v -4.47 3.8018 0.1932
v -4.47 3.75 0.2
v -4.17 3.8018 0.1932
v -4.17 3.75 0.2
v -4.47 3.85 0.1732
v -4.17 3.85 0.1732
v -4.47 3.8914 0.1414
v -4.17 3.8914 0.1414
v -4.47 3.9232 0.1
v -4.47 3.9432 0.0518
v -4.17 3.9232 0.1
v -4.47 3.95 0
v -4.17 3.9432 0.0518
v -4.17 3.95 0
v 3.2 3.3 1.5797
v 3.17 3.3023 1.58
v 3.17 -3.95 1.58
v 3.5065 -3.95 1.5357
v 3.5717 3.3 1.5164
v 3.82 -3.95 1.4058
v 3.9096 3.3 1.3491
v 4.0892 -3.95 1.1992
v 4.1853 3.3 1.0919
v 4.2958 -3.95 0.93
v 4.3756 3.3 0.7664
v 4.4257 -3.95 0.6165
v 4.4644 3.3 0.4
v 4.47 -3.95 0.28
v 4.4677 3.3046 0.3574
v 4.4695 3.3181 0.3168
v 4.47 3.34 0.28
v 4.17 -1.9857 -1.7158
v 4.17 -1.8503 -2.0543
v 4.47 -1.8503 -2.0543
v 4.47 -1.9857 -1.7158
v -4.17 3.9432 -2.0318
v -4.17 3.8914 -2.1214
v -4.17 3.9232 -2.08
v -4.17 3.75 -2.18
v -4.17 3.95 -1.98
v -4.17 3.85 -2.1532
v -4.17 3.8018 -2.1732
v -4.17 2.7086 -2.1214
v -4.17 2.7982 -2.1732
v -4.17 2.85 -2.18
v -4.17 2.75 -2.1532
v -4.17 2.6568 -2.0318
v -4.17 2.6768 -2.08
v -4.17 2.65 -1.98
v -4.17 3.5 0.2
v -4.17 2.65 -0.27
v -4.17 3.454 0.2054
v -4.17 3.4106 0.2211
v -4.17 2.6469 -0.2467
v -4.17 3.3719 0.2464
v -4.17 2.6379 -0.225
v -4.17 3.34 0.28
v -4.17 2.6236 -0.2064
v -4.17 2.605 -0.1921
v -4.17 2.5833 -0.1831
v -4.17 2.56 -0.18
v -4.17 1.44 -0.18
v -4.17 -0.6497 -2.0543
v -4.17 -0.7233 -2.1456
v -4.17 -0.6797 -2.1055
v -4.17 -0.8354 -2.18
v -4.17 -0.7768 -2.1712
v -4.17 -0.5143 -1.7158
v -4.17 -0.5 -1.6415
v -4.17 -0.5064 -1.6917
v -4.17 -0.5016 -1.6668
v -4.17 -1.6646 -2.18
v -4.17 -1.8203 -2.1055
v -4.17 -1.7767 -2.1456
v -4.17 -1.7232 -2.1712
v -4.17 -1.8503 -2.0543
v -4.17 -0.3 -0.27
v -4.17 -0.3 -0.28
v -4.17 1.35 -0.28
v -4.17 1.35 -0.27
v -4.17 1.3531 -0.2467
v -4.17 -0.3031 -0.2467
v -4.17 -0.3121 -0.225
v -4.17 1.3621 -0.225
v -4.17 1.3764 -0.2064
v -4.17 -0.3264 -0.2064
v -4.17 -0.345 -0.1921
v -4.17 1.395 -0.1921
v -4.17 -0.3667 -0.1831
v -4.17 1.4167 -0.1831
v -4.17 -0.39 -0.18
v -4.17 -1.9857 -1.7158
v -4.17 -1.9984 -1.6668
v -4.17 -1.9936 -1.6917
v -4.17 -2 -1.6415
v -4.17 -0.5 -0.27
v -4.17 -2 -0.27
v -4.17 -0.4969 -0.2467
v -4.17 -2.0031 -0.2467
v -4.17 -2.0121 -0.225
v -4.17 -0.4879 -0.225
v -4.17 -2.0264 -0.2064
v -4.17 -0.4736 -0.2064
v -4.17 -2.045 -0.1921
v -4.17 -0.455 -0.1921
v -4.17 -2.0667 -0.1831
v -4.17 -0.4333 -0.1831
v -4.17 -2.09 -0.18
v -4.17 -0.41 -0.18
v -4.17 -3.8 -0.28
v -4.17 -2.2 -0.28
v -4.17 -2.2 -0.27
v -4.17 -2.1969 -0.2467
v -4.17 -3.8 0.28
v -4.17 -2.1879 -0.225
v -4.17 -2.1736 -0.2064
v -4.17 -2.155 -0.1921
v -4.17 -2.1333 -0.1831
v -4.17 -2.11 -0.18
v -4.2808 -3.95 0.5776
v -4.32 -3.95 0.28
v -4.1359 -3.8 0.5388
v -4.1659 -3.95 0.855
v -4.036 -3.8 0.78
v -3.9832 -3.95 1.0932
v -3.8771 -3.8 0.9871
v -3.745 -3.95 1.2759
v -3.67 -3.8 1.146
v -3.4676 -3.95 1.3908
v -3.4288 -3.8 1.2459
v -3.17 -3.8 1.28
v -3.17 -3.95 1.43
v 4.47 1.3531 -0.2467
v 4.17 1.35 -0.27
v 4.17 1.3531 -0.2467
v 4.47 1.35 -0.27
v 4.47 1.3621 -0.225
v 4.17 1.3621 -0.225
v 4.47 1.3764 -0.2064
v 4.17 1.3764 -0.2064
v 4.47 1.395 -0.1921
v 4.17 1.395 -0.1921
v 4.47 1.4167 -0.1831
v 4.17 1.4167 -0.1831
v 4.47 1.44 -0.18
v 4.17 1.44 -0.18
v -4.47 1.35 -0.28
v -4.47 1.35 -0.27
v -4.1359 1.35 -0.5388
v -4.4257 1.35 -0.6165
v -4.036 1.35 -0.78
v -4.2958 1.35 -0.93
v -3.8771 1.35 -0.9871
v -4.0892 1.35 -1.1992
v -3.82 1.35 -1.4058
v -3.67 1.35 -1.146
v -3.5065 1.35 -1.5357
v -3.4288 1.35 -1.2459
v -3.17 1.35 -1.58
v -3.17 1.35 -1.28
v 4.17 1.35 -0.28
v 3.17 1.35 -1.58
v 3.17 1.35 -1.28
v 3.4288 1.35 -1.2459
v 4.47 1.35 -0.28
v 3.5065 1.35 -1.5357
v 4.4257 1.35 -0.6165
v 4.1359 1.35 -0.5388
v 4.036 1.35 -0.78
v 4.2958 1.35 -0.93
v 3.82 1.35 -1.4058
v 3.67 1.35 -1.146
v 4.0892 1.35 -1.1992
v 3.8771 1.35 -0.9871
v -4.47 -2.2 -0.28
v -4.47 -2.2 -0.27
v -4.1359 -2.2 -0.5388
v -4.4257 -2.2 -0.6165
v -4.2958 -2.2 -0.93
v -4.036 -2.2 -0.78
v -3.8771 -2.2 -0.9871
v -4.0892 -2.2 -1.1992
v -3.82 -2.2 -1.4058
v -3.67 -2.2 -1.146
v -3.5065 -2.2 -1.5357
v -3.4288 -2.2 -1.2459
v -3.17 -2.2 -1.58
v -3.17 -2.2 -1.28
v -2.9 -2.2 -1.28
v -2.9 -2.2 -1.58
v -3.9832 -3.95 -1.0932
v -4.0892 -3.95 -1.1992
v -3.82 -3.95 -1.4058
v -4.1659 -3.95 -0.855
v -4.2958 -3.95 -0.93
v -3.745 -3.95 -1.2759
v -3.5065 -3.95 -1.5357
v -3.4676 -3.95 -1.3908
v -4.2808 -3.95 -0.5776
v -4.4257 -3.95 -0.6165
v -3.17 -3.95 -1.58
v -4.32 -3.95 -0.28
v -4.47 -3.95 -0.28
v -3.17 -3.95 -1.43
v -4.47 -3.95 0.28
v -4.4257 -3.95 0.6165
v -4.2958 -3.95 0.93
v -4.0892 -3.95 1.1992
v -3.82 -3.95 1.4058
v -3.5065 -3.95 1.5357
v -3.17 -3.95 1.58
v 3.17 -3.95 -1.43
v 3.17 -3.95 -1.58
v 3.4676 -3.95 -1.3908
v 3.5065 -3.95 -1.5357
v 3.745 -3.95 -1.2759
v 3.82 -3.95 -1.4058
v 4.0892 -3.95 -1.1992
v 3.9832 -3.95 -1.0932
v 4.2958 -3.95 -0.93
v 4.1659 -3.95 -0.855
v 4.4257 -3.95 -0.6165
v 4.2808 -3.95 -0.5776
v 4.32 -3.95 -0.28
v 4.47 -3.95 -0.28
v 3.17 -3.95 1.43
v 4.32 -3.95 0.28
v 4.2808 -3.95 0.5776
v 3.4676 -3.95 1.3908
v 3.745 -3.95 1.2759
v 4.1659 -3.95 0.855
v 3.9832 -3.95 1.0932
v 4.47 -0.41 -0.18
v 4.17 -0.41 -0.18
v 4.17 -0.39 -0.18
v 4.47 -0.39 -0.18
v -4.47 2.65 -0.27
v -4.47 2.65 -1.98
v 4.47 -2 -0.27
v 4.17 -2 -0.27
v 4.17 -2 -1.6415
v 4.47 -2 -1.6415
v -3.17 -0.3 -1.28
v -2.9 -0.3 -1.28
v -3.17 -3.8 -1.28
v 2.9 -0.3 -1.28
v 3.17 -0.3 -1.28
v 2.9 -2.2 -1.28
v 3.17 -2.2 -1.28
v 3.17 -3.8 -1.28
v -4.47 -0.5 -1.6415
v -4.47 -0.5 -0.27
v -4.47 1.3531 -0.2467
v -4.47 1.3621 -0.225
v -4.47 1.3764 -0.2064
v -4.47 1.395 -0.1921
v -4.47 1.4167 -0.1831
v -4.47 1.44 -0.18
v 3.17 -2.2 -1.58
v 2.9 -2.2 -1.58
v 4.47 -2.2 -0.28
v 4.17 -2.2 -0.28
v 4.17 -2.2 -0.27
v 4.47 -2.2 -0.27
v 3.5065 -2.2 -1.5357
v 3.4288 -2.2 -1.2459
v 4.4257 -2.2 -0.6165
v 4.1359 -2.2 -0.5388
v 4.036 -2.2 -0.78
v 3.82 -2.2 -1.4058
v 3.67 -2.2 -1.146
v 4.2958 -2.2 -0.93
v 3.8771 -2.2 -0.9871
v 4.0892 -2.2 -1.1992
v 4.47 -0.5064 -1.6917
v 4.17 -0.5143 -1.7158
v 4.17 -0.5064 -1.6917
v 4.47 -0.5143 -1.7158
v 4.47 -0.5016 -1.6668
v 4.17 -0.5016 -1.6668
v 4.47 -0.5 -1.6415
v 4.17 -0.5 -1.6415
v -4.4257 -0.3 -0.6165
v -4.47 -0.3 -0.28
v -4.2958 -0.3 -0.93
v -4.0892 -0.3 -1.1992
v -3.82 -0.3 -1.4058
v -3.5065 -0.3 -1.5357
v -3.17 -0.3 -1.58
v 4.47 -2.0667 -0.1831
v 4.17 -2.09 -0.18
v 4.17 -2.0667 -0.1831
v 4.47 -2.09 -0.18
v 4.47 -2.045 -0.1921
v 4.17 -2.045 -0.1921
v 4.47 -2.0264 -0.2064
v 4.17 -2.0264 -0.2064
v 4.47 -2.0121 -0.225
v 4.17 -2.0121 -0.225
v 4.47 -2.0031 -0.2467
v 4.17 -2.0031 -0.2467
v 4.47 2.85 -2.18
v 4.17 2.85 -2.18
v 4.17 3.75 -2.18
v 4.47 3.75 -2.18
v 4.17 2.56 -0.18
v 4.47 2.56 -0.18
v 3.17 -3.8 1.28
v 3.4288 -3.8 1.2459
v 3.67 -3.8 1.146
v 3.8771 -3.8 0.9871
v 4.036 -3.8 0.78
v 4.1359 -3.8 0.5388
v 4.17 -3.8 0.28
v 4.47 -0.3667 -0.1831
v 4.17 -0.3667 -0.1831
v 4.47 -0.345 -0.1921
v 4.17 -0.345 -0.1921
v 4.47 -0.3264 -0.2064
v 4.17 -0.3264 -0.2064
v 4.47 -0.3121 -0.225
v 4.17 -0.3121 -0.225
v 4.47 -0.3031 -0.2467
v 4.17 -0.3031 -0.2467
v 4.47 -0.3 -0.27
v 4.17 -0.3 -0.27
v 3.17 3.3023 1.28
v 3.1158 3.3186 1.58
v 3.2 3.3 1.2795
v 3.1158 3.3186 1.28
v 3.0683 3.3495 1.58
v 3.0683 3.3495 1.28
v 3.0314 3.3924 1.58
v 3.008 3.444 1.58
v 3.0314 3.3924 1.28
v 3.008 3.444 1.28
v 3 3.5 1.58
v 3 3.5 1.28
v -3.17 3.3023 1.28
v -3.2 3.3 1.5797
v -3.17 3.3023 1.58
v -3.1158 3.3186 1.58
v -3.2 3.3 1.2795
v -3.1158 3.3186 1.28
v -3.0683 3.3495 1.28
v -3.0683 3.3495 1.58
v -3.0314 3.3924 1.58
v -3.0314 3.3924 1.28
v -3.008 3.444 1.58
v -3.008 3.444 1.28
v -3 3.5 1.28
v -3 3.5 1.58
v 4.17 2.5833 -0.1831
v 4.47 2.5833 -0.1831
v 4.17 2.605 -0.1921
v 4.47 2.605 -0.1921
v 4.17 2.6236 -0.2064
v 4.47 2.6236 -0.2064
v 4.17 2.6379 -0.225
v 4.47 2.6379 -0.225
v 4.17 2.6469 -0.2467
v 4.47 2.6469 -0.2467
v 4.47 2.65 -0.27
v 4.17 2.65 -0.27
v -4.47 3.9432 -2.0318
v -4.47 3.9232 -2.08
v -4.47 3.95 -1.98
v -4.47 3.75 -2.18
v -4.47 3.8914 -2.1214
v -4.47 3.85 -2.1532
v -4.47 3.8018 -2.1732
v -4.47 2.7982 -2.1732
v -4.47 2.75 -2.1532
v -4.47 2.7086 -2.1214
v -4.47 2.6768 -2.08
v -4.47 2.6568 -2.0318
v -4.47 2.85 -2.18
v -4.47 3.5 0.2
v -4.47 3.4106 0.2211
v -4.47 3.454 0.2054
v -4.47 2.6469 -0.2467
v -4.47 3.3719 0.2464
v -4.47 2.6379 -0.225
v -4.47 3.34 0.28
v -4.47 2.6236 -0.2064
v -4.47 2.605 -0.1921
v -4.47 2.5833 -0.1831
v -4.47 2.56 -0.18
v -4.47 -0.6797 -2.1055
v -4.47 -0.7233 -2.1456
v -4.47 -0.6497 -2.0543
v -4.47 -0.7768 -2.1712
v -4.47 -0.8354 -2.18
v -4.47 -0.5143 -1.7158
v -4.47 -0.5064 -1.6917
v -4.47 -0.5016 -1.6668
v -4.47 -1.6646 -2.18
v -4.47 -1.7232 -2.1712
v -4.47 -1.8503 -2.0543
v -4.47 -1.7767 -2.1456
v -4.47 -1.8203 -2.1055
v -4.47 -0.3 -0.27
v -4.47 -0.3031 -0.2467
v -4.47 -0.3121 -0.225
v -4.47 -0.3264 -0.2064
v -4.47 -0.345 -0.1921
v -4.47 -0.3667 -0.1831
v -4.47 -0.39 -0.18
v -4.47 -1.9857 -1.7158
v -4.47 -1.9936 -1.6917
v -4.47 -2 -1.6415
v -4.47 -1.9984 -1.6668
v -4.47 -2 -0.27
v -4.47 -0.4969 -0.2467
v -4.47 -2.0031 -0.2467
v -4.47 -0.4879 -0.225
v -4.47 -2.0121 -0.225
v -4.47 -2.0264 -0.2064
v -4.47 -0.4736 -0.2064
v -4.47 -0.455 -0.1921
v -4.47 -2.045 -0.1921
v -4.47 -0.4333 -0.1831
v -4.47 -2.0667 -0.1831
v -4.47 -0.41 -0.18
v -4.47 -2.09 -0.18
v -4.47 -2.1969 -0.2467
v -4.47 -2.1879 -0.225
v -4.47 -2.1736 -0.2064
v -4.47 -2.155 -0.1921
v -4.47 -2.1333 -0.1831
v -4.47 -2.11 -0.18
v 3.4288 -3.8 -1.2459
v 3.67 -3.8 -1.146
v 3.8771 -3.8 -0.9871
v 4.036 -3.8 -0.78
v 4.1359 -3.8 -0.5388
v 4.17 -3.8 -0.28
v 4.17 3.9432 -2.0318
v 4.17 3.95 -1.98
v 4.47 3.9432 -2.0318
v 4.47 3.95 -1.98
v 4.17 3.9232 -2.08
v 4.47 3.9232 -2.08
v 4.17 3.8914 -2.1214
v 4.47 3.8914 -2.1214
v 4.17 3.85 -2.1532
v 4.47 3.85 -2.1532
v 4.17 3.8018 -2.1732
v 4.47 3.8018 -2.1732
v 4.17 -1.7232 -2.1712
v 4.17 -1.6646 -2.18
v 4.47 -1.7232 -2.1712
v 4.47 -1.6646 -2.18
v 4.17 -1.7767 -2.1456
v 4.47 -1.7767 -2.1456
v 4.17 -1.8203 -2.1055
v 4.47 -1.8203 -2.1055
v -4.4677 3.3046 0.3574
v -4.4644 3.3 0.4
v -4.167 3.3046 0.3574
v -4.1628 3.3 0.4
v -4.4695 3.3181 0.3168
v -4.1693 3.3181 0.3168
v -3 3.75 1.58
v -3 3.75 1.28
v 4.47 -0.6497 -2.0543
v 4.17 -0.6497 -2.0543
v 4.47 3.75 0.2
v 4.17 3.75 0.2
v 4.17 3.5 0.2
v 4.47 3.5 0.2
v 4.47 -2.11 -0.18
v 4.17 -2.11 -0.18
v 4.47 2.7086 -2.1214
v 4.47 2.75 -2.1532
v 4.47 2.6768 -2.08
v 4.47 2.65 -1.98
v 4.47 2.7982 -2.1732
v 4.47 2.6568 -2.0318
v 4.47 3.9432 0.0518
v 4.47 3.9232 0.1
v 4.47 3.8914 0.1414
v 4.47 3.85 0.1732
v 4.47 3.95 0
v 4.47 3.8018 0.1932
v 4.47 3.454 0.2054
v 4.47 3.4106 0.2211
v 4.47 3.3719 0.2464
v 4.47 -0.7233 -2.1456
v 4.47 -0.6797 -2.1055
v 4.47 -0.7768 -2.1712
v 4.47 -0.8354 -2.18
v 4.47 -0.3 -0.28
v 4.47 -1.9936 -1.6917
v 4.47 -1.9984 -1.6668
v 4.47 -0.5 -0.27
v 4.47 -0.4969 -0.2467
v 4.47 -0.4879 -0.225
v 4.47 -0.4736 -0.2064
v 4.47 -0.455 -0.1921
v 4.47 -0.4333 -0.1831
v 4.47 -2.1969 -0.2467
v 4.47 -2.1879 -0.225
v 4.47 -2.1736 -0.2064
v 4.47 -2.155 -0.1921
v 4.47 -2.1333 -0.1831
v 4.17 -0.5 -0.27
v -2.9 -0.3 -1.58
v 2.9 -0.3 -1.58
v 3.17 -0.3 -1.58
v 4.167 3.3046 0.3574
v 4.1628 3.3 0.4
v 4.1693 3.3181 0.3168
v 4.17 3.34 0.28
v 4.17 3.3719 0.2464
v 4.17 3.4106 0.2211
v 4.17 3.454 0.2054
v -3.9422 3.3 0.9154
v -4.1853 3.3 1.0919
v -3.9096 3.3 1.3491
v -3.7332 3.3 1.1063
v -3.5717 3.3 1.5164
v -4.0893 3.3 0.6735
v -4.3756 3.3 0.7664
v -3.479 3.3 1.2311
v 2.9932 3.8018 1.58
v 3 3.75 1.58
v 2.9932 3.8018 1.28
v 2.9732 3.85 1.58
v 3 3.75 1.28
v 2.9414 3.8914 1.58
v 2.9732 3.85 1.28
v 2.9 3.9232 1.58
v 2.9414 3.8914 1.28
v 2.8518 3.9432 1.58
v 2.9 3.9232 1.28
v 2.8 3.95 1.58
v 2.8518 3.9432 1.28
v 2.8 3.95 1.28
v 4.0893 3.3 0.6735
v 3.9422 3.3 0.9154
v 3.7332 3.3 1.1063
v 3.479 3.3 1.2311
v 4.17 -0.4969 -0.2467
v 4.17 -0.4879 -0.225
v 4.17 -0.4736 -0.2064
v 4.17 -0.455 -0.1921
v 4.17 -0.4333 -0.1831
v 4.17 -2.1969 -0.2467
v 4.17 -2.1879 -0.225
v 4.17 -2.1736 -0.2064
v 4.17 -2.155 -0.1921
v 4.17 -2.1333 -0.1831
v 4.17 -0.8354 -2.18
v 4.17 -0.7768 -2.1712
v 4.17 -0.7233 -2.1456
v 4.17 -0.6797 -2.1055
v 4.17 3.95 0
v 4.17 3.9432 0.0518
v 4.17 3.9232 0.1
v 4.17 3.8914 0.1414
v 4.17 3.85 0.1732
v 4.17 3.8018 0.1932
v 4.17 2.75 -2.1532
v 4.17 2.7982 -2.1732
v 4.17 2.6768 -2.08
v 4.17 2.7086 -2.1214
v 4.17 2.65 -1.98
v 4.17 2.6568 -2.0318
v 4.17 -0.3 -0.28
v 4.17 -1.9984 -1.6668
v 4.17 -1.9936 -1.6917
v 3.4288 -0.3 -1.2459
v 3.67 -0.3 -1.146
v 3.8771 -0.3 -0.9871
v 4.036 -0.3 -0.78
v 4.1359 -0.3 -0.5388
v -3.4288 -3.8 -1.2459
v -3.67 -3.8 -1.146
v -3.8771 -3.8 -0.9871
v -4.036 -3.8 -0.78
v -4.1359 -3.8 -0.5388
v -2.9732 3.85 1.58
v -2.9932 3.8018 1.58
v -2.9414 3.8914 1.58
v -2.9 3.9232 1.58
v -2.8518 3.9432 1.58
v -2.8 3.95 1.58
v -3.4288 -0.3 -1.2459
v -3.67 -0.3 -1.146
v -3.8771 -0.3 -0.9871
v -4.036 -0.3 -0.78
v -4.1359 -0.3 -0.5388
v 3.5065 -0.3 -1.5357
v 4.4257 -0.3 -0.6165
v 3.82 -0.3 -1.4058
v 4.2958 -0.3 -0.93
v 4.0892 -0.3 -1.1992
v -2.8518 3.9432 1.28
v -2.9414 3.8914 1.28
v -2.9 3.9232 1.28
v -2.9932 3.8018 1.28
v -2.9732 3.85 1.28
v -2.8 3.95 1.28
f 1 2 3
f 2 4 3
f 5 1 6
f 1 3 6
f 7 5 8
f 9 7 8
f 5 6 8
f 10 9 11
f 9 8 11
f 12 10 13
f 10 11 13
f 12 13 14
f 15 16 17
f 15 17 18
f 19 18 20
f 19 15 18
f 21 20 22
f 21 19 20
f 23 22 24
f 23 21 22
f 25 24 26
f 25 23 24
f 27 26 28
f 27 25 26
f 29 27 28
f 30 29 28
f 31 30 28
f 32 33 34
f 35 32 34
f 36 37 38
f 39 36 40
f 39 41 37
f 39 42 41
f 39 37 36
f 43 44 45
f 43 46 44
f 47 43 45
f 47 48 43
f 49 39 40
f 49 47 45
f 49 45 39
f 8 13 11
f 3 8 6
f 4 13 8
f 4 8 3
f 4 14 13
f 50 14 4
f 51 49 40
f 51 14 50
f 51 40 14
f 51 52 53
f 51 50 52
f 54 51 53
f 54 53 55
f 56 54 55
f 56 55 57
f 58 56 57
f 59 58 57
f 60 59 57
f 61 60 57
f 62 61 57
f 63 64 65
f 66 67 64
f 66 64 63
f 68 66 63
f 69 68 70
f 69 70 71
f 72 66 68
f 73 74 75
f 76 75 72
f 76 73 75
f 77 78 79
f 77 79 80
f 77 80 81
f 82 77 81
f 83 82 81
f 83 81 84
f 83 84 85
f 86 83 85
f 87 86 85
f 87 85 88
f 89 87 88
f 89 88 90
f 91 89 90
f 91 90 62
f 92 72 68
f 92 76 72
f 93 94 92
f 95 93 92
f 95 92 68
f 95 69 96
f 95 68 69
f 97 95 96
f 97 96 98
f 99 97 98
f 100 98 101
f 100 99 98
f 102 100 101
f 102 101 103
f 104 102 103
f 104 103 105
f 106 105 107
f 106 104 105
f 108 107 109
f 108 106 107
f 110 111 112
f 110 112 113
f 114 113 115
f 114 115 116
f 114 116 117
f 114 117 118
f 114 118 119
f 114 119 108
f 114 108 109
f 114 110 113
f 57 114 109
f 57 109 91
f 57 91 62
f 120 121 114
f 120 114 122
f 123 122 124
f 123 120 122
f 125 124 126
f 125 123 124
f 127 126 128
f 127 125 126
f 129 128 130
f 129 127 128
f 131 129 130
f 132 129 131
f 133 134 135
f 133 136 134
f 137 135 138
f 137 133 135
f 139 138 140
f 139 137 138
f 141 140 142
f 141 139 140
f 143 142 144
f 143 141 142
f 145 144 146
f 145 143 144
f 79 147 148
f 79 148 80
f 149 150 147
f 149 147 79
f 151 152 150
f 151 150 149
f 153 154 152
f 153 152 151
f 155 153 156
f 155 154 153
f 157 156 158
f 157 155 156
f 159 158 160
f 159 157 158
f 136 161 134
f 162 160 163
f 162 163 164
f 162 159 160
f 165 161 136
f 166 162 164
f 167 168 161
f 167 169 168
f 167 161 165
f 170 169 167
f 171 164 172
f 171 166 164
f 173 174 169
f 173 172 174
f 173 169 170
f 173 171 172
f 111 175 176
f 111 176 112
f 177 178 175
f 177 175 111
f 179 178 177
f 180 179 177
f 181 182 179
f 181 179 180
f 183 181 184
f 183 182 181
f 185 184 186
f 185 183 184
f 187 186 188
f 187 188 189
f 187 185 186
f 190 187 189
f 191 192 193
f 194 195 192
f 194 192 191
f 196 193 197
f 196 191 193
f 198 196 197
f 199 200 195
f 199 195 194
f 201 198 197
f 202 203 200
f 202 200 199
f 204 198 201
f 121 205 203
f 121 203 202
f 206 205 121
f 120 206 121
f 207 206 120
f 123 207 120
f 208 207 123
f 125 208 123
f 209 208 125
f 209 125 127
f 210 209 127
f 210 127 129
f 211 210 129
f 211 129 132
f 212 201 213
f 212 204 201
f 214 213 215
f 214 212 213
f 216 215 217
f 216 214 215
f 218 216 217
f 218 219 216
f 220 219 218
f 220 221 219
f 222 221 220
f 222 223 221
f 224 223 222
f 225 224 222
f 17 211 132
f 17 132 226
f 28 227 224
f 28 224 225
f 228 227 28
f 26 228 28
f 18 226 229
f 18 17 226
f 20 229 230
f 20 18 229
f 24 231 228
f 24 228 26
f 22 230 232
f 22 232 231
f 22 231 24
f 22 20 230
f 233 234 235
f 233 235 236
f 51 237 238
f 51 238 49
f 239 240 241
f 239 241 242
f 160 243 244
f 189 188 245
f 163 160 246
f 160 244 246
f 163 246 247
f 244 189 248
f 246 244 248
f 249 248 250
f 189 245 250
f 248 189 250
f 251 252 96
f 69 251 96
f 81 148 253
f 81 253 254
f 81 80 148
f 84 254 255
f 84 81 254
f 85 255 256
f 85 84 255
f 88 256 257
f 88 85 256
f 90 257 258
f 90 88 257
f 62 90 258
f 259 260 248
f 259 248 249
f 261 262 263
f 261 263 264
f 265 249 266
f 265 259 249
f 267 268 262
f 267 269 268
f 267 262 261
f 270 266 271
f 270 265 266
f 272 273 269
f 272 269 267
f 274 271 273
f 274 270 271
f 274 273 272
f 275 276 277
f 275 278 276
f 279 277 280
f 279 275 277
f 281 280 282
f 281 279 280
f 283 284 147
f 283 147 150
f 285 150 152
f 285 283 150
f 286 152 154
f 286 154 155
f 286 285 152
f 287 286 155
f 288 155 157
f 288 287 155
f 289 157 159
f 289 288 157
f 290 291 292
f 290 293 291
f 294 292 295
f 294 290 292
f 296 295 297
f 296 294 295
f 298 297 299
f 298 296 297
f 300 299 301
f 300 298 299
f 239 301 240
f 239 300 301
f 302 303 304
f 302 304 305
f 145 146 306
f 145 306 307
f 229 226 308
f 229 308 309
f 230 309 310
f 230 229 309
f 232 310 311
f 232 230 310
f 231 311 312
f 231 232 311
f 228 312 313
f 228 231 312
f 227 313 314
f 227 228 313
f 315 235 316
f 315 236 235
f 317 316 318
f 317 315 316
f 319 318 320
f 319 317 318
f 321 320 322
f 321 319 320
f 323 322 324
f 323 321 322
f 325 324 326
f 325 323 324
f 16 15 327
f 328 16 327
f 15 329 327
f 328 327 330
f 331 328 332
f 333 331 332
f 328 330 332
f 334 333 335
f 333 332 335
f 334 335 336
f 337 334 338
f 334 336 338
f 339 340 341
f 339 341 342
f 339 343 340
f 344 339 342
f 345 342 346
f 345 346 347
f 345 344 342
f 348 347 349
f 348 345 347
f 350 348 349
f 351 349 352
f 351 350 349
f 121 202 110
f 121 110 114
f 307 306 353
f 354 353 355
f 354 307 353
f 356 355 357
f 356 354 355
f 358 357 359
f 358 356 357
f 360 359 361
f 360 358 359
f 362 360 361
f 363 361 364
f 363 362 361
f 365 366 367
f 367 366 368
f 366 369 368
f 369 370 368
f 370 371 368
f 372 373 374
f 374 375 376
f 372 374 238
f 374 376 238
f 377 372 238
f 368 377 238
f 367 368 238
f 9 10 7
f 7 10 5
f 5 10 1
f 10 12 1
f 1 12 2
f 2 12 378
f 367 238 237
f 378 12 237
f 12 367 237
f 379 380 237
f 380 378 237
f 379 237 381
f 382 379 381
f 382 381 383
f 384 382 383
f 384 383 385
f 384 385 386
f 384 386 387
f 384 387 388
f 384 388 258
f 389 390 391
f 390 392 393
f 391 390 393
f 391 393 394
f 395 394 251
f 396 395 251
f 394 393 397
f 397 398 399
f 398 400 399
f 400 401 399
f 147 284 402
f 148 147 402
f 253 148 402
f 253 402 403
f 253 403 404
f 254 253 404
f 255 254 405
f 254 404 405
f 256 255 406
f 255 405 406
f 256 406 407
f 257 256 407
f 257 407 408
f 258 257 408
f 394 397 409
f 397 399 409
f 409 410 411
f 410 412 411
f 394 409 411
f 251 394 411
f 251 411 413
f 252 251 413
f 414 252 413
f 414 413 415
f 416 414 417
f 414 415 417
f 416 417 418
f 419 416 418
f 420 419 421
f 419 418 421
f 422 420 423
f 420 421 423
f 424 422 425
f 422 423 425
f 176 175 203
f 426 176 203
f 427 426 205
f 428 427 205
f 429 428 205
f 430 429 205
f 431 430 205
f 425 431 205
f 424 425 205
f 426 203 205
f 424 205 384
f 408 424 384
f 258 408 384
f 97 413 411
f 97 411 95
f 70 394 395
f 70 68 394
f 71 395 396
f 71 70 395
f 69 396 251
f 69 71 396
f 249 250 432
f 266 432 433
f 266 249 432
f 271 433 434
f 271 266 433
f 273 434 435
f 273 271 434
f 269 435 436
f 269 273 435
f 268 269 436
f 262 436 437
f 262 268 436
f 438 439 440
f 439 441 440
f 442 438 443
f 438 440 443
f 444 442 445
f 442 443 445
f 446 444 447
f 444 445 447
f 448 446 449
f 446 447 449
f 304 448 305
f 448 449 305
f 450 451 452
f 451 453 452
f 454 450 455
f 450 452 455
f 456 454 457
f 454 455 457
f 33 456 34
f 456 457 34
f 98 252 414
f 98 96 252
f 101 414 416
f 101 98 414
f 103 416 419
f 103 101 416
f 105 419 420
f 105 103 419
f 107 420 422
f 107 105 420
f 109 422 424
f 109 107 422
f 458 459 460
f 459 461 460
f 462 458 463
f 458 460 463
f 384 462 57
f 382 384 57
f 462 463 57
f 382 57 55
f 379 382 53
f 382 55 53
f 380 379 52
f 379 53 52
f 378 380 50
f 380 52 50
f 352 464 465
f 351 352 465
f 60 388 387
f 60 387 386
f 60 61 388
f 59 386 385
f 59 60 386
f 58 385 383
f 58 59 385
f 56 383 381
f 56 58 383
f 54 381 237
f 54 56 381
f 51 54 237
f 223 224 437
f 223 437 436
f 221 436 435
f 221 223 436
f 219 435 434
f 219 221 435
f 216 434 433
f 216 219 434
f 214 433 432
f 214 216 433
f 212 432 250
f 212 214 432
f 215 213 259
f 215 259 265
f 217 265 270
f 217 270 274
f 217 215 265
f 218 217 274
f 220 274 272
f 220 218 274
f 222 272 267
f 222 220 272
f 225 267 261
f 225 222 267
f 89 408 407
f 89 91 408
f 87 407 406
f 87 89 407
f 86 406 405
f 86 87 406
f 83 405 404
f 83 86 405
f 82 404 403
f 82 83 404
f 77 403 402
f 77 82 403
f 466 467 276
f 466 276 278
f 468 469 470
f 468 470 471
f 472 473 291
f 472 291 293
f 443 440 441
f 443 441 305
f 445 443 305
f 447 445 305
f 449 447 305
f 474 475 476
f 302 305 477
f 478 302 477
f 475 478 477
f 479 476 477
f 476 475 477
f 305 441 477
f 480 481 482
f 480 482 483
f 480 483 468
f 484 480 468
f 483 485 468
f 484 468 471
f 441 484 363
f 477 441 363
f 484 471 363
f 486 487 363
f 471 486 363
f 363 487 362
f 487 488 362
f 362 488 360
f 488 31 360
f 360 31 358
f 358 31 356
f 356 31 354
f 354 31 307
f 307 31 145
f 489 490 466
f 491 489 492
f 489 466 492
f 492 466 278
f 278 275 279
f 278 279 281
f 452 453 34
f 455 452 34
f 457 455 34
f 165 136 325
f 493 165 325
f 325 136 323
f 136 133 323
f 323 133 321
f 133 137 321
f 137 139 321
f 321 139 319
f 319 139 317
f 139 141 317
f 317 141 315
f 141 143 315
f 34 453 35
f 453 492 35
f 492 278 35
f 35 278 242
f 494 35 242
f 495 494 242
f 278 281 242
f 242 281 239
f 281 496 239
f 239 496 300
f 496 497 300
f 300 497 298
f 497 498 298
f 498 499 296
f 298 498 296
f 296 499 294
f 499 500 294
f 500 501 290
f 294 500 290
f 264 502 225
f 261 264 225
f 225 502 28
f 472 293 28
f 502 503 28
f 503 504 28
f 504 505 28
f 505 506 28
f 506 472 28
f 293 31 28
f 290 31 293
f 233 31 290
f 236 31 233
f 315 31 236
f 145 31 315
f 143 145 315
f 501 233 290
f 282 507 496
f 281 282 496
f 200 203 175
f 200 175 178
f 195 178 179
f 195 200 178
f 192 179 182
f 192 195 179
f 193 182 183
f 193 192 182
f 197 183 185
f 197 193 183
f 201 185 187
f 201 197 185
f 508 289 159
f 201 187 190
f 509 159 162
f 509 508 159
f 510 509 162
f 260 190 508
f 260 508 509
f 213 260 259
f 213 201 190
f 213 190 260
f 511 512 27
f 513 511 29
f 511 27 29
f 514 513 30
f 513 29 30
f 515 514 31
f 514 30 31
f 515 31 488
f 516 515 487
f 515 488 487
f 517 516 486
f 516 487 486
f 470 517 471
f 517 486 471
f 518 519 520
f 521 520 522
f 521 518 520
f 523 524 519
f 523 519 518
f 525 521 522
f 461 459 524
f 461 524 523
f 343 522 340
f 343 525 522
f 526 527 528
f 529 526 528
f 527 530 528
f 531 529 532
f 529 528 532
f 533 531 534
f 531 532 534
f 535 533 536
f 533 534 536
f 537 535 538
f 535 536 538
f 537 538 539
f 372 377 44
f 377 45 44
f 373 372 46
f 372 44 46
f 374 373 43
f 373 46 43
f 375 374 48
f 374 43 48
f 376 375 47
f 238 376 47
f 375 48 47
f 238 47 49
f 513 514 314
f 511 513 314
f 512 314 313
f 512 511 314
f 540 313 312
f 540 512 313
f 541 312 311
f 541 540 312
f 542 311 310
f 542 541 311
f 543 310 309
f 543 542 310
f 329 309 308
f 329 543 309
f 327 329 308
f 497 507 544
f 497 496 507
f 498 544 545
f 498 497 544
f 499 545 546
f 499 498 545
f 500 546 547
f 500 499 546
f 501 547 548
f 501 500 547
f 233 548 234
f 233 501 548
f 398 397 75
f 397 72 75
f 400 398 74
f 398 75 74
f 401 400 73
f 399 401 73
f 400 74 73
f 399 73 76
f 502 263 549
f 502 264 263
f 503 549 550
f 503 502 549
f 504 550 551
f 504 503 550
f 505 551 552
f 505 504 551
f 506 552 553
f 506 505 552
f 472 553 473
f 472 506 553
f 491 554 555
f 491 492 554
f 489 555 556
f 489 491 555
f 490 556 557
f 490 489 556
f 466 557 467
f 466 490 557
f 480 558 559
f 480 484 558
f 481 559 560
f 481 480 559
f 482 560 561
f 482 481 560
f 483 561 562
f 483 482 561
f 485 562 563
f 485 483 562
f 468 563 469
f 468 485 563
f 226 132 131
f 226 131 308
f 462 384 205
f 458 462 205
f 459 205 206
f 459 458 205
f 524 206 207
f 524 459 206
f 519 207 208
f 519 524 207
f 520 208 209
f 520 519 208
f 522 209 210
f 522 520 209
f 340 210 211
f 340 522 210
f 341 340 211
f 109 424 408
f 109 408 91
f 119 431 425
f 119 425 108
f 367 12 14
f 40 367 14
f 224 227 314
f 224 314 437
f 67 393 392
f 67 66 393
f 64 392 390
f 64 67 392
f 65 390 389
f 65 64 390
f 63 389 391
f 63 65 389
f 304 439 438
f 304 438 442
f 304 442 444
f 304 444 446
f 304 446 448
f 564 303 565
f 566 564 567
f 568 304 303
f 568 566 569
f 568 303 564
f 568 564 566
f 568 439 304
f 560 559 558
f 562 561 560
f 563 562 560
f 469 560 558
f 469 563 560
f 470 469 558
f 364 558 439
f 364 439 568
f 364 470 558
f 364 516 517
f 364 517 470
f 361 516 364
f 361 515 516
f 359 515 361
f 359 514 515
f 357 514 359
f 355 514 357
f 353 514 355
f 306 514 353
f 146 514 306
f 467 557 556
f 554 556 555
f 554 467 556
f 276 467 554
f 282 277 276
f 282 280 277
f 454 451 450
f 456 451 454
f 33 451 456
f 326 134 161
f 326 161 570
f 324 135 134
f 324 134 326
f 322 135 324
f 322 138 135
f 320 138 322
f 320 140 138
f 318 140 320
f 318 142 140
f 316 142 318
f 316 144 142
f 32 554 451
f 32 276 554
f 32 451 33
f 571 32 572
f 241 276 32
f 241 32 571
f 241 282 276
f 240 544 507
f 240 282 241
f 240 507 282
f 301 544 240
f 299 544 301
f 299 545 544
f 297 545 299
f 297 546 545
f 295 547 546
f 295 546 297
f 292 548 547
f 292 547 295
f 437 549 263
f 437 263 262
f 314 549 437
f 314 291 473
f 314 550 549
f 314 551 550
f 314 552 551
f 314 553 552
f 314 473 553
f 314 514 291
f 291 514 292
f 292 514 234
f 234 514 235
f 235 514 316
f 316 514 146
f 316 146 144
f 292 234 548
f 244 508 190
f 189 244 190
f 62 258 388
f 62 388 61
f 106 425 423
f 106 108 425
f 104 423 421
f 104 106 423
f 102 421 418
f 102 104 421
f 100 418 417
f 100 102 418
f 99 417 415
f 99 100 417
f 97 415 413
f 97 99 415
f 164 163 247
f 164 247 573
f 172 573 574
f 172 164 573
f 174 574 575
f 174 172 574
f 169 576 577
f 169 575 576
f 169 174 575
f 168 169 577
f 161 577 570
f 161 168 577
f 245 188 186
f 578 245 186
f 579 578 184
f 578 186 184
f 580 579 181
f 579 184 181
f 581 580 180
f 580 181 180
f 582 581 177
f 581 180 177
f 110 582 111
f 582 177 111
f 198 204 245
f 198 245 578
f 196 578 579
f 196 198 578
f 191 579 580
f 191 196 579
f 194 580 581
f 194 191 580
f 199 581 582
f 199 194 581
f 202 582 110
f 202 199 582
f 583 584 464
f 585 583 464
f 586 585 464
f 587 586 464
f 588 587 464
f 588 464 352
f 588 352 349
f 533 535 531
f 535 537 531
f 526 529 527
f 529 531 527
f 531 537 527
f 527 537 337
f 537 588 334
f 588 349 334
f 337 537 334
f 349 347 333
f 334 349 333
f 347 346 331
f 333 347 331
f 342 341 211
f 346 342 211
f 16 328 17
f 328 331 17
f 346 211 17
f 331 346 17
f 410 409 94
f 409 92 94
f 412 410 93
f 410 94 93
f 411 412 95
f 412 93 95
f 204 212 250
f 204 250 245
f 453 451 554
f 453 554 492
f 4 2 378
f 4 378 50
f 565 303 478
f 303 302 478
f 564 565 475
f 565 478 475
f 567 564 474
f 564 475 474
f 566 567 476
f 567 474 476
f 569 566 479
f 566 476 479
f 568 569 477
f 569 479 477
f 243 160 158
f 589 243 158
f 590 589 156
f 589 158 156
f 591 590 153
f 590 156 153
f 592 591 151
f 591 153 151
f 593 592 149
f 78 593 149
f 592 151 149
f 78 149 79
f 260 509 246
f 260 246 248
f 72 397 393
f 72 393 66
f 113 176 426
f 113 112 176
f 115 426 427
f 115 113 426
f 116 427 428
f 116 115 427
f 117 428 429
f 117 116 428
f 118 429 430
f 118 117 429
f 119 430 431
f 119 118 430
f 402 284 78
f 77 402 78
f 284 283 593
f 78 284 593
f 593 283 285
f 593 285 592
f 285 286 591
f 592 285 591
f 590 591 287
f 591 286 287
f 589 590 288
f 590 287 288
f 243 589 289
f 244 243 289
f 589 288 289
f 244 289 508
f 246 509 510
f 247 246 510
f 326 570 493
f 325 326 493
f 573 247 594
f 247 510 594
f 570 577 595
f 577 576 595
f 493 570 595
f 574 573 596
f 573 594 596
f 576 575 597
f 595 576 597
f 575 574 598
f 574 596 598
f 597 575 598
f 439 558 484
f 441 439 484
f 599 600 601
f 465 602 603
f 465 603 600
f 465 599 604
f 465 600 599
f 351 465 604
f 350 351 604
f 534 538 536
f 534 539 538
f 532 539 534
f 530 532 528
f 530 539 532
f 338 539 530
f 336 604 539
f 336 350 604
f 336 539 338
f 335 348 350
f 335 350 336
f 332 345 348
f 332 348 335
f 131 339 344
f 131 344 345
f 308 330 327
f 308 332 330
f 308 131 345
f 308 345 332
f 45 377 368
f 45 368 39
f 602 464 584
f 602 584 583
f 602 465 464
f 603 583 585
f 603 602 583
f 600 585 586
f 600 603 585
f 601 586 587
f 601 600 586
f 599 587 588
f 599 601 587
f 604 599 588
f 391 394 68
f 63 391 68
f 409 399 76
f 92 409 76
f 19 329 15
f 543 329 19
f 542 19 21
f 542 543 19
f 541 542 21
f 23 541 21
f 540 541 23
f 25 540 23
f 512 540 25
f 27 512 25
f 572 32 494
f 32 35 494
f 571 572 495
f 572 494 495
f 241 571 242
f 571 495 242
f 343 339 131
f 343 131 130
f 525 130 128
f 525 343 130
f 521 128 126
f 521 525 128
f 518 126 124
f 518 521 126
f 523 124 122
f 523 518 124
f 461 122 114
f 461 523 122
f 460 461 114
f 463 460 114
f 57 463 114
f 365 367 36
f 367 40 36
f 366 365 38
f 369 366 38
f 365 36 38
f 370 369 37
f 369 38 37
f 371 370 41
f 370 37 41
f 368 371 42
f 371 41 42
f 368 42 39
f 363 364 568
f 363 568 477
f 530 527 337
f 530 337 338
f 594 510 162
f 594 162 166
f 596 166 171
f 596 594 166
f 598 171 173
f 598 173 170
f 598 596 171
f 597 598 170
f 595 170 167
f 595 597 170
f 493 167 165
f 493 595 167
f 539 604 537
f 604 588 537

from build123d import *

# Parameters (mm, degrees)
SKETCH_W           = 8.94
SKETCH_H           = 3.16
PAD_DEPTH          = 3.95
SKETCH001_W        = 8.34
SKETCH001_H        = 2.56
POCKET_DEPTH       = 7.901
FILLET_R           = 1
FILLET001_R        = 1.3
CHAMFER_SIZE       = 0.15
SKETCH002_W        = 2
SKETCH002_H        = 1.9
SKETCH002_H_2      = 2.6
POCKET001_DEPTH    = 1.4
SKETCH003_W        = 0.3
SKETCH003_H        = 1.5
SKETCH003_H_2      = 1.3
PAD001_DEPTH       = 2
FILLET002_R        = 0.09
CHAMFER001_1_SIZE2 = 0.2
CHAMFER001_1_SIZE  = 0.5
CHAMFER001_2_SIZE2 = 0.2
CHAMFER001_2_SIZE  = 0.5
CHAMFER001_3_SIZE2 = 0.2
CHAMFER001_3_SIZE  = 0.5
CHAMFER002_SIZE2   = 0.5
CHAMFER002_SIZE    = 0.2
FILLET003_R        = 0.2
SKETCH004_W        = 5.8
SKETCH004_H        = 2.6
POCKET002_DEPTH    = 0.5
SKETCH005_W        = 1.7
SKETCH005_H        = 1.7
POCKET003_DEPTH    = 0.65
FILLET004_R        = 0.2


with BuildPart() as part:
    # Sketch → Pad (new body, symmetric)
    with BuildSketch(Plane.XZ):
        Rectangle(SKETCH_W, SKETCH_H)
    extrude(amount=PAD_DEPTH, both=True)

    # Sketch001 (on Face6 of Pad) → Pocket (cut, through all)
    with BuildSketch(Plane.XZ.offset(3.95)):
        Rectangle(SKETCH001_W, SKETCH001_H)
    extrude(amount=-POCKET_DEPTH, mode=Mode.SUBTRACT)

    # Fillet
    fillet_edges = [part.edges().sort_by_distance(p)[0] for p in [
        (-4.17, 0, -1.28),
        (-4.17, 0, 1.28),
        (4.17, 0, -1.28),
        (4.17, 0, 1.28),
    ]]
    fillet(fillet_edges, radius=FILLET_R)

    # Fillet001
    fillet001_edges = [part.edges().sort_by_distance(p)[0] for p in [
        (-4.47, 0, 1.58),
        (-4.47, 0, -1.58),
        (4.47, 0, 1.58),
        (4.47, 0, -1.58),
    ]]
    fillet(fillet001_edges, radius=FILLET001_R)

    # Chamfer
    chamfer_edges = [part.edges().sort_by_distance(p)[0] for p in [
        (0, -3.95, 1.28),
    ]]
    chamfer(chamfer_edges, length=CHAMFER_SIZE)

    # Sketch002 (on Face17 of Chamfer) → Pocket001 (cut)
    with BuildSketch(Plane(origin=(0, 0, -1.58), x_dir=(1, 0, 0), z_dir=(0, 0, -1))):
        with Locations((3.9, 1.25)):
            Rectangle(SKETCH002_W, SKETCH002_H)
        with Locations((-3.9, 1.25)):
            Rectangle(SKETCH002_W, SKETCH002_H)
        with Locations((-3.9, -2.65)):
            Rectangle(SKETCH002_W, SKETCH002_H_2)
        with Locations((3.9, -2.65)):
            Rectangle(SKETCH002_W, SKETCH002_H_2)
    extrude(amount=-POCKET001_DEPTH, mode=Mode.SUBTRACT)

    # Sketch003 (on Face5 of Pocket001) → Pad001 (join)
    with BuildSketch(Plane(origin=(0, 0, -0.18), x_dir=(1, 0, 0), z_dir=(0, 0, -1))):
        with Locations((-4.32, 1.25)):
            Rectangle(SKETCH003_W, SKETCH003_H)
        with Locations((4.32, 1.25)):
            Rectangle(SKETCH003_W, SKETCH003_H)
        with Locations((4.32, -3.3)):
            Rectangle(SKETCH003_W, SKETCH003_H_2)
        with Locations((-4.32, -3.3)):
            Rectangle(SKETCH003_W, SKETCH003_H_2)
    extrude(amount=PAD001_DEPTH)

    # Fillet002
    fillet002_edges = [part.edges().sort_by_distance(p)[0] for p in [
        (-4.32, -2, -0.18),
        (-4.32, -2.2, -0.18),
        (-4.32, -0.5, -0.18),
        (-4.32, -0.3, -0.18),
        (-4.32, 1.35, -0.18),
        (-4.32, 2.65, -0.18),
        (4.32, 2.65, -0.18),
        (4.32, 1.35, -0.18),
        (4.32, -2.2, -0.18),
        (4.32, -2, -0.18),
        (4.32, -0.5, -0.18),
        (4.32, -0.3, -0.18),
    ]]
    fillet(fillet002_edges, radius=FILLET002_R)

    # Chamfer001 1
    chamfer001_1_edges = [part.edges().sort_by_distance(p)[0] for p in [
        (4.32, -2, -2.18),
    ]]
    chamfer001_1_side = part.faces().sort_by_distance((4.32, -2, -1.225))[0]
    chamfer(chamfer001_1_edges, length=CHAMFER001_1_SIZE, length2=CHAMFER001_1_SIZE2, reference=chamfer001_1_side)

    # Chamfer001 2
    chamfer001_2_edges = [part.edges().sort_by_distance(p)[0] for p in [
        (4.32, -0.5, -2.18),
    ]]
    chamfer001_2_side = part.faces().sort_by_distance((4.32, -0.5, -1.225))[0]
    chamfer(chamfer001_2_edges, length=CHAMFER001_2_SIZE, length2=CHAMFER001_2_SIZE2, reference=chamfer001_2_side)

    # Chamfer001 3
    chamfer001_3_edges = [part.edges().sort_by_distance(p)[0] for p in [
        (-4.32, -2, -2.18),
    ]]
    chamfer001_3_side = part.faces().sort_by_distance((-4.32, -2, -1.225))[0]
    chamfer(chamfer001_3_edges, length=CHAMFER001_3_SIZE, length2=CHAMFER001_3_SIZE2, reference=chamfer001_3_side)

    # Chamfer002
    chamfer002_edges = [part.edges().sort_by_distance(p)[0] for p in [
        (-4.32, -0.5, -2.18),
    ]]
    chamfer002_side = part.faces().sort_by_distance((-4.32, -1.15, -2.18))[0]
    chamfer(chamfer002_edges, length=CHAMFER002_SIZE, length2=CHAMFER002_SIZE2, reference=chamfer002_side)

    # Fillet003
    fillet003_edges = [part.edges().sort_by_distance(p)[0] for p in [
        (-4.32, -0.7, -2.18),
        (-4.32, -1.8, -2.18),
        (-4.32, -0.5, -1.68),
        (-4.32, -2, -1.68),
        (4.32, -2, -1.68),
        (4.32, -0.5, -1.68),
        (4.32, -0.7, -2.18),
        (4.32, -1.8, -2.18),
        (4.32, 2.65, -2.18),
        (4.32, 3.95, -2.18),
        (-4.32, 2.65, -2.18),
        (-4.32, 3.95, -2.18),
    ]]
    fillet(fillet003_edges, radius=FILLET003_R)

    # Sketch004 (on Face36 of Fillet003) → Pocket002 (cut)
    with BuildSketch(Plane(origin=(0, 0, -1.58), x_dir=(1, 0, 0), z_dir=(0, 0, -1))):
        with Locations((0, -2.65)):
            Rectangle(SKETCH004_W, SKETCH004_H)
    extrude(amount=-POCKET002_DEPTH, mode=Mode.SUBTRACT)

    # Sketch005 (on Face24 of Pocket002) → Pocket003 (cut)
    with BuildSketch(Plane(origin=(0, 3.95, 0), x_dir=(1, 0, 0), z_dir=(0, 1, 0))):
        with Locations((-3.85, -1.05)):
            Rectangle(SKETCH005_W, SKETCH005_H)
        with Locations((3.85, -1.05)):
            Rectangle(SKETCH005_W, SKETCH005_H)
    extrude(amount=-POCKET003_DEPTH, mode=Mode.SUBTRACT)

    # Fillet004
    fillet004_edges = [part.edges().sort_by_distance(p)[0] for p in [
        (-3, 3.3, 1.43),
        (-4.32, 3.95, 0.2),
        (-4.32, 3.3, 0.2),
        (-3, 3.95, 1.43),
        (3, 3.95, 1.43),
        (3, 3.3, 1.43),
        (4.32, 3.3, 0.2),
        (4.32, 3.95, 0.2),
    ]]
    fillet(fillet004_edges, radius=FILLET004_R)


solid = part.part
